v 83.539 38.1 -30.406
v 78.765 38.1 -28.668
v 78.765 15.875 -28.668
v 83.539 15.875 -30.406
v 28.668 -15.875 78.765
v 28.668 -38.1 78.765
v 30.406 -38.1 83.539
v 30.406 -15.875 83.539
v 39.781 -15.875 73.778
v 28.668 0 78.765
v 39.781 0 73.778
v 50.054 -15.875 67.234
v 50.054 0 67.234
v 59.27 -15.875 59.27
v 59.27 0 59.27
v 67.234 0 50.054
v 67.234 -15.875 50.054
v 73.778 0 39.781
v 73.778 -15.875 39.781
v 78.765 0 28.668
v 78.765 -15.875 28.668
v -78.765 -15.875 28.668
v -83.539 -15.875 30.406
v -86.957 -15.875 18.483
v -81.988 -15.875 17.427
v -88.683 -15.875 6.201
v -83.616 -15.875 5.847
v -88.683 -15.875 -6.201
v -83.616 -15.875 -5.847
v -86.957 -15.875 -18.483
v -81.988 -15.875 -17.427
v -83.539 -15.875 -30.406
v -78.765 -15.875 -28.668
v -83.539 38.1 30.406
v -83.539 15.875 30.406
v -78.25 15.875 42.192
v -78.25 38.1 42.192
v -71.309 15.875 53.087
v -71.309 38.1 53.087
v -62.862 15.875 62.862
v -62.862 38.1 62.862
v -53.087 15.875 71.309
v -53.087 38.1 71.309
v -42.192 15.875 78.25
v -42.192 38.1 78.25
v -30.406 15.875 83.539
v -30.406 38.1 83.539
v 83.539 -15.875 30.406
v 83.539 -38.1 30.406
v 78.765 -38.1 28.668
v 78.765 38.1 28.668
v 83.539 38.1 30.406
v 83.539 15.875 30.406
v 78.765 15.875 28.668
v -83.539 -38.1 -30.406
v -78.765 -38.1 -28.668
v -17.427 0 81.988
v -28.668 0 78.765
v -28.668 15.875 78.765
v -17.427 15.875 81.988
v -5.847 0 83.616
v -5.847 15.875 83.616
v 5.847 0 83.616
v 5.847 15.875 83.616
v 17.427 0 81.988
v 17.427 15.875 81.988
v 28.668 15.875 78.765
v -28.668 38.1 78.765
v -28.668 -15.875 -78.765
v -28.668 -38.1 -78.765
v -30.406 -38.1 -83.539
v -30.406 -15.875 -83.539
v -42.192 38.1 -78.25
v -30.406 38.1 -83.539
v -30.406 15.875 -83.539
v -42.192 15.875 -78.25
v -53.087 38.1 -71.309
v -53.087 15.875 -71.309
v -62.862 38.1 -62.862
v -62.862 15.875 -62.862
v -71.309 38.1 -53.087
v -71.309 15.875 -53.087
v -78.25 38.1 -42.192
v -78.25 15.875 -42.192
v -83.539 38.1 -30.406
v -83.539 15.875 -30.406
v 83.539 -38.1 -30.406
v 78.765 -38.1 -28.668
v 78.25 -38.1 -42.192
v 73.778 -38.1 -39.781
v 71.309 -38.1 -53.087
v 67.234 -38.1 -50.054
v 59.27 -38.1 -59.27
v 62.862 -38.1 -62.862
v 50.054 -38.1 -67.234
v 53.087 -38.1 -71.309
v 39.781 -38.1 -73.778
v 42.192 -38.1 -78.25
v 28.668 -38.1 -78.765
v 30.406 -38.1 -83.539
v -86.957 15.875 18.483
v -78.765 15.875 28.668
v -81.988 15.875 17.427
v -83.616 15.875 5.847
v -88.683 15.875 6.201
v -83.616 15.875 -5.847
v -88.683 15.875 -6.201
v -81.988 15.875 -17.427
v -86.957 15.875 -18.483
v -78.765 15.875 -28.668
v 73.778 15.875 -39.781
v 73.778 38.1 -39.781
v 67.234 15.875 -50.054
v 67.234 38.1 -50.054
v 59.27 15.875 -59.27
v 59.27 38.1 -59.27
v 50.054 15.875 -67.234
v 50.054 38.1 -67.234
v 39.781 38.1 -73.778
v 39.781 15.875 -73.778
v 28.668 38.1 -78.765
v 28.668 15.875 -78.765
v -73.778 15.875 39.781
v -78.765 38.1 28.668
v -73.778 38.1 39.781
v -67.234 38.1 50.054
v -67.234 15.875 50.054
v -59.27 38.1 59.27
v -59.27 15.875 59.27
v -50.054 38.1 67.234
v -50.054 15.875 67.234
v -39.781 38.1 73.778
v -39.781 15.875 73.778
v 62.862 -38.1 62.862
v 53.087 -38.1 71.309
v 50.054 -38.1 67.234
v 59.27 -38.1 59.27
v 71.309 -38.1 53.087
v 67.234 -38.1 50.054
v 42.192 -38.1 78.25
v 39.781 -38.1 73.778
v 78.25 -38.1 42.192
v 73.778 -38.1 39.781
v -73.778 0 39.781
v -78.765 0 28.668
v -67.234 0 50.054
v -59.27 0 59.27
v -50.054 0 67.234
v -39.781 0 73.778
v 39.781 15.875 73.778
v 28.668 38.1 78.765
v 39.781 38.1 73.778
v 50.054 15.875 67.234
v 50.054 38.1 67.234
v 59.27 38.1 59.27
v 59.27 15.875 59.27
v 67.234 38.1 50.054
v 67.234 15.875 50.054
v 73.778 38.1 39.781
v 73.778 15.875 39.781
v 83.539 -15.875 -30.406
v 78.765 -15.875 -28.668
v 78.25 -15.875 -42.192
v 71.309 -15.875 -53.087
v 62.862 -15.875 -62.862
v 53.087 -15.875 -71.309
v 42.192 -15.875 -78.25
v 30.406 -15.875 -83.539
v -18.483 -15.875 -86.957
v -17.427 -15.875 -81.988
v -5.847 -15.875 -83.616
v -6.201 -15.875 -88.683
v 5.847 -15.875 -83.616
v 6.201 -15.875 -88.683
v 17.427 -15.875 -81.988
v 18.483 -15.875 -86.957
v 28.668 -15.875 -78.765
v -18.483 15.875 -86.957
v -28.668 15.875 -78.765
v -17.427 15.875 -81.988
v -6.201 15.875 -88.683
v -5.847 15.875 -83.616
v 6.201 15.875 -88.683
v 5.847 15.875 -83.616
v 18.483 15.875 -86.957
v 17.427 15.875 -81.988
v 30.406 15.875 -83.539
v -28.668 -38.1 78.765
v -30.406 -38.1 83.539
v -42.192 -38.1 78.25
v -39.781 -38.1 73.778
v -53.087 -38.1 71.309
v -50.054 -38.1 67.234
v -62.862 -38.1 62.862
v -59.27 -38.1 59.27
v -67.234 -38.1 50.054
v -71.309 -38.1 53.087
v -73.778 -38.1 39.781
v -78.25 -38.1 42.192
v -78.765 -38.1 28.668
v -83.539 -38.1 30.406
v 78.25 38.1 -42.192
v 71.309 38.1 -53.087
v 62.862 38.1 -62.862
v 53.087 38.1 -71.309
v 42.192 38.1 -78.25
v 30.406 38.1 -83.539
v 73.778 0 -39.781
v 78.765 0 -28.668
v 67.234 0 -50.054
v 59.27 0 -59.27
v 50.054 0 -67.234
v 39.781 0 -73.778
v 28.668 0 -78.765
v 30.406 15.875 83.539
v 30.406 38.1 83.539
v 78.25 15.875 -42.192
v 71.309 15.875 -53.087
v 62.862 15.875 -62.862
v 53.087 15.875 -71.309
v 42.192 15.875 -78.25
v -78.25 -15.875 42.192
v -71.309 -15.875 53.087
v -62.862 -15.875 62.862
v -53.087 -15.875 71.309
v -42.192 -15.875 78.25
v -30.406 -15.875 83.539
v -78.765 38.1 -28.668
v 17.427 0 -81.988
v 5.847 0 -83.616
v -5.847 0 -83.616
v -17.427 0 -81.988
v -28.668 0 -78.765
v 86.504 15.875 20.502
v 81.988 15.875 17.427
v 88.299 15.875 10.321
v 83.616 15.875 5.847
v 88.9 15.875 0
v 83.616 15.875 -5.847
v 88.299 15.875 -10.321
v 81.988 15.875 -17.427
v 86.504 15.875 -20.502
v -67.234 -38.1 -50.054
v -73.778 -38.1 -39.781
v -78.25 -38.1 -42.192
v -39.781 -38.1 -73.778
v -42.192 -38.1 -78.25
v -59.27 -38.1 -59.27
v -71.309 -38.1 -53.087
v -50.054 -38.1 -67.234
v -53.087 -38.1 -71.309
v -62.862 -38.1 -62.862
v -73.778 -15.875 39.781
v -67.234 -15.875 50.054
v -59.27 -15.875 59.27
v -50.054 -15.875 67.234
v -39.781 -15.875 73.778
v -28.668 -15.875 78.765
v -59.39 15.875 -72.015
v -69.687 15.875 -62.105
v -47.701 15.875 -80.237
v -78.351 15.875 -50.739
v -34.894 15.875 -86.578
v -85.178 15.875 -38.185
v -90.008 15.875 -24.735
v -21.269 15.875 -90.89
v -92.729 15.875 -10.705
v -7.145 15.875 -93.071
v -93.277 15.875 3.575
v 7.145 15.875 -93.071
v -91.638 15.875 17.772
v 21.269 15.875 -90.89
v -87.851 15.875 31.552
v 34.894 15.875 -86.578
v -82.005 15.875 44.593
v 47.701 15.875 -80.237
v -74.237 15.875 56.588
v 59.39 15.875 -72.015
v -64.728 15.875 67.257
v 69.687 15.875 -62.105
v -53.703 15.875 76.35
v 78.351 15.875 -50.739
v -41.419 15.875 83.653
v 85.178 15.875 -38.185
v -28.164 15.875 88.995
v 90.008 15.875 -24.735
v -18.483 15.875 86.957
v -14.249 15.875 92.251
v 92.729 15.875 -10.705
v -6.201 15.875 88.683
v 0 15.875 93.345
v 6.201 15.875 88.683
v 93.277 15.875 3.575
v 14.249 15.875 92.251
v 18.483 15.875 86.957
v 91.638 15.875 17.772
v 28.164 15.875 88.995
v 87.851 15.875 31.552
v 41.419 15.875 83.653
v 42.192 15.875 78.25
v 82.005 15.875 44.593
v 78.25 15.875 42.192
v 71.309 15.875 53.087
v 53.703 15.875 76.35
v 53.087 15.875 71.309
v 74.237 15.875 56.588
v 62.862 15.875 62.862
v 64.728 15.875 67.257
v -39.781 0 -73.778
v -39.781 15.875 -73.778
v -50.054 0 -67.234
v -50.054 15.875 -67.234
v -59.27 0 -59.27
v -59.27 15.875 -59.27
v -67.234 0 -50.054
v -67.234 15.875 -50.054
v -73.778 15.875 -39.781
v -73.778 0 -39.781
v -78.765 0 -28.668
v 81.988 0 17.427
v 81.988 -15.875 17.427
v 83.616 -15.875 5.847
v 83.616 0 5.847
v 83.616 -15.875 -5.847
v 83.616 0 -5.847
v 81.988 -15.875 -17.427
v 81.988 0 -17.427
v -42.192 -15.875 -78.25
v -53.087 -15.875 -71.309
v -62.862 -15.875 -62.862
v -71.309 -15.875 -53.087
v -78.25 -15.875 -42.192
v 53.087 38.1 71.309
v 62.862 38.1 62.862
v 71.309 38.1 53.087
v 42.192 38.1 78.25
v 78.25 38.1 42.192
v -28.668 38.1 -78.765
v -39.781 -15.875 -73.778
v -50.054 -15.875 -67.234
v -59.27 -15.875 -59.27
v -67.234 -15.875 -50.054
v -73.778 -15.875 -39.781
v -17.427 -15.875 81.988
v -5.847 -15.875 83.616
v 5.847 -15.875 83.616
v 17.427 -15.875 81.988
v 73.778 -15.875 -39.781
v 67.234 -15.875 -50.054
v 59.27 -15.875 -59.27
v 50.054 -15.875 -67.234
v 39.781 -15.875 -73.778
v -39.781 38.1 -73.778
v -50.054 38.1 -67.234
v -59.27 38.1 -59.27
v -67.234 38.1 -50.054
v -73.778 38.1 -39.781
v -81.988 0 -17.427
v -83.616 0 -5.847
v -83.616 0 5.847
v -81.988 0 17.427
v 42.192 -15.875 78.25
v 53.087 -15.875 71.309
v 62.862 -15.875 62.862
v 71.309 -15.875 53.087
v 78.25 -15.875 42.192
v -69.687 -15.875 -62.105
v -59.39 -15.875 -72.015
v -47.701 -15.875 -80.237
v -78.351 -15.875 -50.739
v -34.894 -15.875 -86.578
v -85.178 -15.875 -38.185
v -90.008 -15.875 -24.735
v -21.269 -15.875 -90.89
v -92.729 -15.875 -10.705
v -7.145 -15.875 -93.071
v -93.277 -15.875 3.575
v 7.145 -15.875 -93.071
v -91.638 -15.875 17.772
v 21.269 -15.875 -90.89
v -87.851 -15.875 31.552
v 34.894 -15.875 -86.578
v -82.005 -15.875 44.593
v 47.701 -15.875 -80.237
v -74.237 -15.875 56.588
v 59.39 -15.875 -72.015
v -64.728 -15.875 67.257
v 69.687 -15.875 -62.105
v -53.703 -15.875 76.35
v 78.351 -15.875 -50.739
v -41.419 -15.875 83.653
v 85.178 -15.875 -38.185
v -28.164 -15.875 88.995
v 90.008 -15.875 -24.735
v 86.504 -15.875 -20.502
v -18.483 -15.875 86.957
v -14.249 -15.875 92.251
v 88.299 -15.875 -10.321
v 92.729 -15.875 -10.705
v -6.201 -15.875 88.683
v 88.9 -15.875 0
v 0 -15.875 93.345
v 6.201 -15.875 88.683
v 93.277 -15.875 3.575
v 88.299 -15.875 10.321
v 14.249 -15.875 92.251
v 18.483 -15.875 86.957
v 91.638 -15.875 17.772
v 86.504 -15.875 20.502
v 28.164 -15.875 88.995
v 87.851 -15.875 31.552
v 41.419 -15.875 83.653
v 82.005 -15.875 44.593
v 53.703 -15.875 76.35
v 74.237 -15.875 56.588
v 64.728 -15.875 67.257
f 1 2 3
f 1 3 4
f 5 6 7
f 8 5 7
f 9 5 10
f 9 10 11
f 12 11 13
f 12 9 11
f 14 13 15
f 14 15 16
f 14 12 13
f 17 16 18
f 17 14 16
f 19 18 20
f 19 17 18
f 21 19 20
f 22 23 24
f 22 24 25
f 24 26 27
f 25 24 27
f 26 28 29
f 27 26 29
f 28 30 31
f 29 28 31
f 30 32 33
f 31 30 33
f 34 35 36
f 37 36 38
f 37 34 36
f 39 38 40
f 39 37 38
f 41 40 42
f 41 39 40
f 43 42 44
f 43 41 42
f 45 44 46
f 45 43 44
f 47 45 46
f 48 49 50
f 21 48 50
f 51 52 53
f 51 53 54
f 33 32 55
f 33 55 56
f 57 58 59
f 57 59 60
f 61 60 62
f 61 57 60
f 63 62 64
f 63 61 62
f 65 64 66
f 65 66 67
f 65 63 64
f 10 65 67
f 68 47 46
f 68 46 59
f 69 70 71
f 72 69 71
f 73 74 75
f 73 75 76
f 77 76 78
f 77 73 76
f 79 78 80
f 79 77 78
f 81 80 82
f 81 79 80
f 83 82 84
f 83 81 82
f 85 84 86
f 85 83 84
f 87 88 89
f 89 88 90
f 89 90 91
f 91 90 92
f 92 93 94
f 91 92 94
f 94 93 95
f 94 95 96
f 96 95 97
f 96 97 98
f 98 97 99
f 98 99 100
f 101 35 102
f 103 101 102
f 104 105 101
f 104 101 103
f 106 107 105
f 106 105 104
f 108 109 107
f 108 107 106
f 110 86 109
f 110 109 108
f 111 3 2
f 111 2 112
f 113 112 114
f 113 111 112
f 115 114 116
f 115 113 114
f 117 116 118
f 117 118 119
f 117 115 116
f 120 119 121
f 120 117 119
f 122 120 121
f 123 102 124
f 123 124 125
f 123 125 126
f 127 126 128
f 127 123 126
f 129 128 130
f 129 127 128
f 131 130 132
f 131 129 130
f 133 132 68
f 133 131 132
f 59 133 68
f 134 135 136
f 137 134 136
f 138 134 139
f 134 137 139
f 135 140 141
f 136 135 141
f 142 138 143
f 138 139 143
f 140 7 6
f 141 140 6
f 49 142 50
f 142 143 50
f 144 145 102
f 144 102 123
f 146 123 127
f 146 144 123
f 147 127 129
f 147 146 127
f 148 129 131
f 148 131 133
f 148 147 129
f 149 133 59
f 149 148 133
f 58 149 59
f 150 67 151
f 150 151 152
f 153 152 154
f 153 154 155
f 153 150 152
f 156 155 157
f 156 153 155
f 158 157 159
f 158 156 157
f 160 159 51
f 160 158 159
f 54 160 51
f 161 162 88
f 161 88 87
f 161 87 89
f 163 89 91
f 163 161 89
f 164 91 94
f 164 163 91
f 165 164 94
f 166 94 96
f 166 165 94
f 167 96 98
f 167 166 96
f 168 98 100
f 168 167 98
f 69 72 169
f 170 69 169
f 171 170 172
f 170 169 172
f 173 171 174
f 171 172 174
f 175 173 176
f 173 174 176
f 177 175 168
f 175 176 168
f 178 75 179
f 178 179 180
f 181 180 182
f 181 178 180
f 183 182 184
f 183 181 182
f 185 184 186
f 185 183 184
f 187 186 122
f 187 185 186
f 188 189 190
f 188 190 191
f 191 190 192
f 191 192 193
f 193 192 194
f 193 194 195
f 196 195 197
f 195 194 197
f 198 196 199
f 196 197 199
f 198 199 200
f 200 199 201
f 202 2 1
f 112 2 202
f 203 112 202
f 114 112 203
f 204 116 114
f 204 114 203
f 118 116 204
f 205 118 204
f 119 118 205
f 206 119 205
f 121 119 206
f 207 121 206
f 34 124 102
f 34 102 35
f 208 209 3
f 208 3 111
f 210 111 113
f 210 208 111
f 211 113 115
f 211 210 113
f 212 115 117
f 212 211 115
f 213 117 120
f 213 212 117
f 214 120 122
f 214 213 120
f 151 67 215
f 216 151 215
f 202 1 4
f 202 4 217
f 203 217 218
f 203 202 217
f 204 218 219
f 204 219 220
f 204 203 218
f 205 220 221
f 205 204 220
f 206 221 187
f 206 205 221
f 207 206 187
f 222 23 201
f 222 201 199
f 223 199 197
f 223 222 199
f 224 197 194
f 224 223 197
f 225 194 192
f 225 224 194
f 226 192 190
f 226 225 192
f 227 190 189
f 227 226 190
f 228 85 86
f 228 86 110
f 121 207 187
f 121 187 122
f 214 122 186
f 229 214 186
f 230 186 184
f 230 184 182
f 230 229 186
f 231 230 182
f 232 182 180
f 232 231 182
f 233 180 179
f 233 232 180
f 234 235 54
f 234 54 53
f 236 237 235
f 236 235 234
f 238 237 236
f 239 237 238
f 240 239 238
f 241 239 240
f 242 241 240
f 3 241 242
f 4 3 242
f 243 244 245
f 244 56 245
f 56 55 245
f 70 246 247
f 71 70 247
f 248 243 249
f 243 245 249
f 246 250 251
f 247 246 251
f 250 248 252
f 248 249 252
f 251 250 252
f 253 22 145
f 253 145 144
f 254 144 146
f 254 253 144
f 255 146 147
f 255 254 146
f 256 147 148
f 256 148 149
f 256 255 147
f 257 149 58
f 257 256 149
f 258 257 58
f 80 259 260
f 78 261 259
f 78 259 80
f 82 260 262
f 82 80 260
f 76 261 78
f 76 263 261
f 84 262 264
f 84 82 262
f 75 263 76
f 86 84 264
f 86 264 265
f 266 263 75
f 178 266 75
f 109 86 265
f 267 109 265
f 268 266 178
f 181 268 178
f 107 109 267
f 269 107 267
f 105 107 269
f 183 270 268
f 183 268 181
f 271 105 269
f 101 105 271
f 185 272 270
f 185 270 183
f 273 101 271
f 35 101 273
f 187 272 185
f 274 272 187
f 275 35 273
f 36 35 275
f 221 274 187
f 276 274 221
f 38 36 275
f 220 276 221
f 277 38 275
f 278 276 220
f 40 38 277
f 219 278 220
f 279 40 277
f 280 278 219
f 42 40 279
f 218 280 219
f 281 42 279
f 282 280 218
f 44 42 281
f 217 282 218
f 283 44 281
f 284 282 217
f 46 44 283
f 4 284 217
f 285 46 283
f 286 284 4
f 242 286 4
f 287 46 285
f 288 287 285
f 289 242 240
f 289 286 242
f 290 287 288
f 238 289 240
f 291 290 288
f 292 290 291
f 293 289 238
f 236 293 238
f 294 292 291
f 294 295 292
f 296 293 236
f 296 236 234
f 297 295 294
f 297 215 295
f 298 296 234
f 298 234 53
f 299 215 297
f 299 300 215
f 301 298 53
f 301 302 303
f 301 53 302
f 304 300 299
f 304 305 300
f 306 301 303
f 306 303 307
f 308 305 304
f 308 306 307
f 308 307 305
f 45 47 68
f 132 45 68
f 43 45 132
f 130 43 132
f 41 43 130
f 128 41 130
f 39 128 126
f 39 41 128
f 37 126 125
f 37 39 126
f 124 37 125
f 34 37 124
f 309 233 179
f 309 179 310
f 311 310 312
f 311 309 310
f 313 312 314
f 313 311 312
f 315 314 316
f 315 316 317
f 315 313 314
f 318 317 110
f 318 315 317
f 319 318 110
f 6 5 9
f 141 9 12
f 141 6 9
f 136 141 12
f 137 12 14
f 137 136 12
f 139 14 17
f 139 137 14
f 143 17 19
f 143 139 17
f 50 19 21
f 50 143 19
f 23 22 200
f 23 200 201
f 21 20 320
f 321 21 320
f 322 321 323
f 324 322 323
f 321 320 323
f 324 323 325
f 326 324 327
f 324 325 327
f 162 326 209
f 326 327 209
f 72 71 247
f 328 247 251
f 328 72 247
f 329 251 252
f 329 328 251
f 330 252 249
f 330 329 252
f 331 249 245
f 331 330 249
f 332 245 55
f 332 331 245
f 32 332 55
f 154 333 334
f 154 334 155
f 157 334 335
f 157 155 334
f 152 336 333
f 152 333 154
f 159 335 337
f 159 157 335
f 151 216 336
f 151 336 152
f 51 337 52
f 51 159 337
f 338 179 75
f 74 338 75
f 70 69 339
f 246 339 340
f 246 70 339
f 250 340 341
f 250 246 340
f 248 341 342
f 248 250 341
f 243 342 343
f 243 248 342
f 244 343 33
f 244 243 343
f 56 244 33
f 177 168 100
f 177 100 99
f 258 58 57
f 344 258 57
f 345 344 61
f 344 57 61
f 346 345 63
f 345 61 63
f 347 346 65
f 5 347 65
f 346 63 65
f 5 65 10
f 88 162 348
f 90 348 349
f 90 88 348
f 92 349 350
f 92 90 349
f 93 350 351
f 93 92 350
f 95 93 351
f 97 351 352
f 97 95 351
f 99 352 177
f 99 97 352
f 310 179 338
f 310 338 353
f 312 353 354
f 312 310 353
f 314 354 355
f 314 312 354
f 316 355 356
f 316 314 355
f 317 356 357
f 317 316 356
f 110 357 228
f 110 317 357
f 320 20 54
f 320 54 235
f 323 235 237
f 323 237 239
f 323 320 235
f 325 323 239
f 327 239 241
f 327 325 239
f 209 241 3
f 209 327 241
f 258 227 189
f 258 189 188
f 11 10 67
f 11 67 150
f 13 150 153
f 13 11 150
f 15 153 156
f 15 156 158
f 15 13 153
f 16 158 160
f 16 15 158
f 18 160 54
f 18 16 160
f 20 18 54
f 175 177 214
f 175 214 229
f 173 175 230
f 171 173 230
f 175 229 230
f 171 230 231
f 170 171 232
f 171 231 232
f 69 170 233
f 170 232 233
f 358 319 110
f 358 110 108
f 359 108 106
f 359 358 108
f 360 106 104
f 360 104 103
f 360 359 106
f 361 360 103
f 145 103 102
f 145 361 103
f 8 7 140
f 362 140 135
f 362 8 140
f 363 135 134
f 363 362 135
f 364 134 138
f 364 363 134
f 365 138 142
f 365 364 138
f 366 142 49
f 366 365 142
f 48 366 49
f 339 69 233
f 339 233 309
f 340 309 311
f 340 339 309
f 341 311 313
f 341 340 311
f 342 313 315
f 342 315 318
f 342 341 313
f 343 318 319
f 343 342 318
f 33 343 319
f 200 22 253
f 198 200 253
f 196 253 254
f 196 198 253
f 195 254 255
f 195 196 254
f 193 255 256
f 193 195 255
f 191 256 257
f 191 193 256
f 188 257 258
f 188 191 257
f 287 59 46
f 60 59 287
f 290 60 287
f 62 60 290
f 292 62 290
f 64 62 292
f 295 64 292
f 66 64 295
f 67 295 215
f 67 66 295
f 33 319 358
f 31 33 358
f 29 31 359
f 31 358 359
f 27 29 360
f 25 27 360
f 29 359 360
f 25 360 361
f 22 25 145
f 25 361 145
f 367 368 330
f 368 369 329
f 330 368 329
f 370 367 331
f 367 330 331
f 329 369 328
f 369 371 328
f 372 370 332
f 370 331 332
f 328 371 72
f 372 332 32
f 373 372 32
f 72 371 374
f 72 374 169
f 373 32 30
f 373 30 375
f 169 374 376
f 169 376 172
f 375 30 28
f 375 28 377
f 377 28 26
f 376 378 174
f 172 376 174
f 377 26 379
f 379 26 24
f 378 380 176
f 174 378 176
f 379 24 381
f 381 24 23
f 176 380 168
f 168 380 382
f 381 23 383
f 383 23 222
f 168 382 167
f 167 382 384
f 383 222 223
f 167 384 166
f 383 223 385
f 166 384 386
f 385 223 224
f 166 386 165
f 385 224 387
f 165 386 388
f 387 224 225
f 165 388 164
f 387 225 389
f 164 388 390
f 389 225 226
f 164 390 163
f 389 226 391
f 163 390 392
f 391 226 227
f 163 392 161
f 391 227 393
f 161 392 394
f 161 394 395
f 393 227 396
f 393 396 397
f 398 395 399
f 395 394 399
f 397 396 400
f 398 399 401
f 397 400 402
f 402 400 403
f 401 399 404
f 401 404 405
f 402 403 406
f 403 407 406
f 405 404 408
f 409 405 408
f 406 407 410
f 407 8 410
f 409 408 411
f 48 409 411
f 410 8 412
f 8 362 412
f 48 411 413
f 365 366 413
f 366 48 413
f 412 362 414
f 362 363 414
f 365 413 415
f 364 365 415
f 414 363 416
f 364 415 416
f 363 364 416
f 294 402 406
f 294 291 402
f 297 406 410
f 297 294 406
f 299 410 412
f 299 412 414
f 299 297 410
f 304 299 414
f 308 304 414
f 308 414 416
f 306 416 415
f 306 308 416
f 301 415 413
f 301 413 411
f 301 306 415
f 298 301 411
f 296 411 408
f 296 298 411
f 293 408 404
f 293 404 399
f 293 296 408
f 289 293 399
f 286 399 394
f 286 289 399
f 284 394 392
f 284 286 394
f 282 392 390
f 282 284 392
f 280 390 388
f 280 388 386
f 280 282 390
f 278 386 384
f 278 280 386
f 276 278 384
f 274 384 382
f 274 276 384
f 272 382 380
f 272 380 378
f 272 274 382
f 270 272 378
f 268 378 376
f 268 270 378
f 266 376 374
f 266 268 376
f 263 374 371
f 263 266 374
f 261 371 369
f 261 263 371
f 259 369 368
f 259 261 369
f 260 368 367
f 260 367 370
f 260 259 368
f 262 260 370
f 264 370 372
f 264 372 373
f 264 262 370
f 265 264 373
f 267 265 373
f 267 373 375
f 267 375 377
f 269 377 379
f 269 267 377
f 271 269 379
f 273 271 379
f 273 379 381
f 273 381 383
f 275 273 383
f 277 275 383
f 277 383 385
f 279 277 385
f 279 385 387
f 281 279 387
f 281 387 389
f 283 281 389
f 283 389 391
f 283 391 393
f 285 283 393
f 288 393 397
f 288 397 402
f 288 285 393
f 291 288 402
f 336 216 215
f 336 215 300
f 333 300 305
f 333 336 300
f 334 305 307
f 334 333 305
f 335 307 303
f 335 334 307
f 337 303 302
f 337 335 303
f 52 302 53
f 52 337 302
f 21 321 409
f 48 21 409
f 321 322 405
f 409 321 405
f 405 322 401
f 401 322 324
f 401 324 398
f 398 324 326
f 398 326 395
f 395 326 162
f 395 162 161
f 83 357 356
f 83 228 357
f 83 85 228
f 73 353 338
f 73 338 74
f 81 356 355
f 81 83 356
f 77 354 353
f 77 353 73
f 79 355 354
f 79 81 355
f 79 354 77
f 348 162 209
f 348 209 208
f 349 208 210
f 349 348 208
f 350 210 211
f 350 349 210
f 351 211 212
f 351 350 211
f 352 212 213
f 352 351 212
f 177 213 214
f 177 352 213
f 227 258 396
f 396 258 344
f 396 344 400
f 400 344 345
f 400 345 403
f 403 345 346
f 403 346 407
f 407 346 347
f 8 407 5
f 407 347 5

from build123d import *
from build123d.topology import SkipClean

# Parameters (mm, degrees)
SKETCH1_R           = 93.345
SKETCH1_R_2         = 83.82
BOSS_EXTRUDE1_DEPTH = 15.875
SKETCH2_R           = 88.9
SKETCH2_R_2         = 83.82
BOSS_EXTRUDE2_DEPTH = 38.1
CUT_EXTRUDE1_DEPTH  = 38.1
CIRPATTERN1_COUNT   = 4
SKETCH4_R           = 88.9
SKETCH4_R_2         = 83.82
BOSS_EXTRUDE3_DEPTH = 15.875


with BuildPart() as part:
    # Sketch1 → Boss-Extrude1 (new, symmetric)
    with BuildSketch(Plane(origin=(0, 0, 0), x_dir=(1, 0, 0), z_dir=(0, 1, 0))):
        with Locations(Location((0, 0, 0), (0, 0, 270))):
            Circle(SKETCH1_R)
        with Locations(Location((0, 0, 0), (0, 0, 270))):
            Circle(SKETCH1_R_2, mode=Mode.SUBTRACT)
    extrude(amount=BOSS_EXTRUDE1_DEPTH, both=True)

    # Sketch2 → Boss-Extrude2 (add, symmetric)
    with BuildSketch(Plane(origin=(0, 0, 0), x_dir=(1, 0, 0), z_dir=(0, 1, 0))):
        with Locations(Location((0, 0, 0), (0, 0, 90))):
            Circle(SKETCH2_R)
        with Locations(Location((0, 0, 0), (0, 0, 270))):
            Circle(SKETCH2_R_2, mode=Mode.SUBTRACT)
    extrude(amount=BOSS_EXTRUDE2_DEPTH, both=True)

    # Sketch3 → Cut-Extrude1 (cut, symmetric)
    with BuildSketch(Plane(origin=(0, 0, 0), x_dir=(1, 0, 0), z_dir=(0, 1, 0))):
        with BuildLine():
            Line((0, 0), (-30.405590742, 83.538673988))
            ThreePointArc((-30.405590742, 83.538673988), (0, 88.9), (30.405590742, 83.538673988))
            Line((30.405590742, 83.538673988), (0, 0))
        make_face()
    cut_extrude1 = extrude(amount=CUT_EXTRUDE1_DEPTH, both=True, mode=Mode.SUBTRACT)

    # CirPattern1: Cut-Extrude1 ×4 about axis
    cirpattern1_axis = Axis((0, 38.1, 0), (0, -1, 0))
    for i in range(1, CIRPATTERN1_COUNT):
        add(cut_extrude1.rotate(cirpattern1_axis, i * 360 / CIRPATTERN1_COUNT), mode=Mode.SUBTRACT)

    # Sketch4 → Boss-Extrude3 (add, symmetric)
    with SkipClean():  # the faces are left unmerged after this step: merging them gives an invalid solid
        with BuildSketch(Plane(origin=(0, 0, 0), x_dir=(1, 0, 0), z_dir=(0, 1, 0))):
            Circle(SKETCH4_R)
            with Locations(Location((0, 0, 0), (0, 0, 110))):
                Circle(SKETCH4_R_2, mode=Mode.SUBTRACT)
        extrude(amount=BOSS_EXTRUDE3_DEPTH, both=True)


solid = part.part
